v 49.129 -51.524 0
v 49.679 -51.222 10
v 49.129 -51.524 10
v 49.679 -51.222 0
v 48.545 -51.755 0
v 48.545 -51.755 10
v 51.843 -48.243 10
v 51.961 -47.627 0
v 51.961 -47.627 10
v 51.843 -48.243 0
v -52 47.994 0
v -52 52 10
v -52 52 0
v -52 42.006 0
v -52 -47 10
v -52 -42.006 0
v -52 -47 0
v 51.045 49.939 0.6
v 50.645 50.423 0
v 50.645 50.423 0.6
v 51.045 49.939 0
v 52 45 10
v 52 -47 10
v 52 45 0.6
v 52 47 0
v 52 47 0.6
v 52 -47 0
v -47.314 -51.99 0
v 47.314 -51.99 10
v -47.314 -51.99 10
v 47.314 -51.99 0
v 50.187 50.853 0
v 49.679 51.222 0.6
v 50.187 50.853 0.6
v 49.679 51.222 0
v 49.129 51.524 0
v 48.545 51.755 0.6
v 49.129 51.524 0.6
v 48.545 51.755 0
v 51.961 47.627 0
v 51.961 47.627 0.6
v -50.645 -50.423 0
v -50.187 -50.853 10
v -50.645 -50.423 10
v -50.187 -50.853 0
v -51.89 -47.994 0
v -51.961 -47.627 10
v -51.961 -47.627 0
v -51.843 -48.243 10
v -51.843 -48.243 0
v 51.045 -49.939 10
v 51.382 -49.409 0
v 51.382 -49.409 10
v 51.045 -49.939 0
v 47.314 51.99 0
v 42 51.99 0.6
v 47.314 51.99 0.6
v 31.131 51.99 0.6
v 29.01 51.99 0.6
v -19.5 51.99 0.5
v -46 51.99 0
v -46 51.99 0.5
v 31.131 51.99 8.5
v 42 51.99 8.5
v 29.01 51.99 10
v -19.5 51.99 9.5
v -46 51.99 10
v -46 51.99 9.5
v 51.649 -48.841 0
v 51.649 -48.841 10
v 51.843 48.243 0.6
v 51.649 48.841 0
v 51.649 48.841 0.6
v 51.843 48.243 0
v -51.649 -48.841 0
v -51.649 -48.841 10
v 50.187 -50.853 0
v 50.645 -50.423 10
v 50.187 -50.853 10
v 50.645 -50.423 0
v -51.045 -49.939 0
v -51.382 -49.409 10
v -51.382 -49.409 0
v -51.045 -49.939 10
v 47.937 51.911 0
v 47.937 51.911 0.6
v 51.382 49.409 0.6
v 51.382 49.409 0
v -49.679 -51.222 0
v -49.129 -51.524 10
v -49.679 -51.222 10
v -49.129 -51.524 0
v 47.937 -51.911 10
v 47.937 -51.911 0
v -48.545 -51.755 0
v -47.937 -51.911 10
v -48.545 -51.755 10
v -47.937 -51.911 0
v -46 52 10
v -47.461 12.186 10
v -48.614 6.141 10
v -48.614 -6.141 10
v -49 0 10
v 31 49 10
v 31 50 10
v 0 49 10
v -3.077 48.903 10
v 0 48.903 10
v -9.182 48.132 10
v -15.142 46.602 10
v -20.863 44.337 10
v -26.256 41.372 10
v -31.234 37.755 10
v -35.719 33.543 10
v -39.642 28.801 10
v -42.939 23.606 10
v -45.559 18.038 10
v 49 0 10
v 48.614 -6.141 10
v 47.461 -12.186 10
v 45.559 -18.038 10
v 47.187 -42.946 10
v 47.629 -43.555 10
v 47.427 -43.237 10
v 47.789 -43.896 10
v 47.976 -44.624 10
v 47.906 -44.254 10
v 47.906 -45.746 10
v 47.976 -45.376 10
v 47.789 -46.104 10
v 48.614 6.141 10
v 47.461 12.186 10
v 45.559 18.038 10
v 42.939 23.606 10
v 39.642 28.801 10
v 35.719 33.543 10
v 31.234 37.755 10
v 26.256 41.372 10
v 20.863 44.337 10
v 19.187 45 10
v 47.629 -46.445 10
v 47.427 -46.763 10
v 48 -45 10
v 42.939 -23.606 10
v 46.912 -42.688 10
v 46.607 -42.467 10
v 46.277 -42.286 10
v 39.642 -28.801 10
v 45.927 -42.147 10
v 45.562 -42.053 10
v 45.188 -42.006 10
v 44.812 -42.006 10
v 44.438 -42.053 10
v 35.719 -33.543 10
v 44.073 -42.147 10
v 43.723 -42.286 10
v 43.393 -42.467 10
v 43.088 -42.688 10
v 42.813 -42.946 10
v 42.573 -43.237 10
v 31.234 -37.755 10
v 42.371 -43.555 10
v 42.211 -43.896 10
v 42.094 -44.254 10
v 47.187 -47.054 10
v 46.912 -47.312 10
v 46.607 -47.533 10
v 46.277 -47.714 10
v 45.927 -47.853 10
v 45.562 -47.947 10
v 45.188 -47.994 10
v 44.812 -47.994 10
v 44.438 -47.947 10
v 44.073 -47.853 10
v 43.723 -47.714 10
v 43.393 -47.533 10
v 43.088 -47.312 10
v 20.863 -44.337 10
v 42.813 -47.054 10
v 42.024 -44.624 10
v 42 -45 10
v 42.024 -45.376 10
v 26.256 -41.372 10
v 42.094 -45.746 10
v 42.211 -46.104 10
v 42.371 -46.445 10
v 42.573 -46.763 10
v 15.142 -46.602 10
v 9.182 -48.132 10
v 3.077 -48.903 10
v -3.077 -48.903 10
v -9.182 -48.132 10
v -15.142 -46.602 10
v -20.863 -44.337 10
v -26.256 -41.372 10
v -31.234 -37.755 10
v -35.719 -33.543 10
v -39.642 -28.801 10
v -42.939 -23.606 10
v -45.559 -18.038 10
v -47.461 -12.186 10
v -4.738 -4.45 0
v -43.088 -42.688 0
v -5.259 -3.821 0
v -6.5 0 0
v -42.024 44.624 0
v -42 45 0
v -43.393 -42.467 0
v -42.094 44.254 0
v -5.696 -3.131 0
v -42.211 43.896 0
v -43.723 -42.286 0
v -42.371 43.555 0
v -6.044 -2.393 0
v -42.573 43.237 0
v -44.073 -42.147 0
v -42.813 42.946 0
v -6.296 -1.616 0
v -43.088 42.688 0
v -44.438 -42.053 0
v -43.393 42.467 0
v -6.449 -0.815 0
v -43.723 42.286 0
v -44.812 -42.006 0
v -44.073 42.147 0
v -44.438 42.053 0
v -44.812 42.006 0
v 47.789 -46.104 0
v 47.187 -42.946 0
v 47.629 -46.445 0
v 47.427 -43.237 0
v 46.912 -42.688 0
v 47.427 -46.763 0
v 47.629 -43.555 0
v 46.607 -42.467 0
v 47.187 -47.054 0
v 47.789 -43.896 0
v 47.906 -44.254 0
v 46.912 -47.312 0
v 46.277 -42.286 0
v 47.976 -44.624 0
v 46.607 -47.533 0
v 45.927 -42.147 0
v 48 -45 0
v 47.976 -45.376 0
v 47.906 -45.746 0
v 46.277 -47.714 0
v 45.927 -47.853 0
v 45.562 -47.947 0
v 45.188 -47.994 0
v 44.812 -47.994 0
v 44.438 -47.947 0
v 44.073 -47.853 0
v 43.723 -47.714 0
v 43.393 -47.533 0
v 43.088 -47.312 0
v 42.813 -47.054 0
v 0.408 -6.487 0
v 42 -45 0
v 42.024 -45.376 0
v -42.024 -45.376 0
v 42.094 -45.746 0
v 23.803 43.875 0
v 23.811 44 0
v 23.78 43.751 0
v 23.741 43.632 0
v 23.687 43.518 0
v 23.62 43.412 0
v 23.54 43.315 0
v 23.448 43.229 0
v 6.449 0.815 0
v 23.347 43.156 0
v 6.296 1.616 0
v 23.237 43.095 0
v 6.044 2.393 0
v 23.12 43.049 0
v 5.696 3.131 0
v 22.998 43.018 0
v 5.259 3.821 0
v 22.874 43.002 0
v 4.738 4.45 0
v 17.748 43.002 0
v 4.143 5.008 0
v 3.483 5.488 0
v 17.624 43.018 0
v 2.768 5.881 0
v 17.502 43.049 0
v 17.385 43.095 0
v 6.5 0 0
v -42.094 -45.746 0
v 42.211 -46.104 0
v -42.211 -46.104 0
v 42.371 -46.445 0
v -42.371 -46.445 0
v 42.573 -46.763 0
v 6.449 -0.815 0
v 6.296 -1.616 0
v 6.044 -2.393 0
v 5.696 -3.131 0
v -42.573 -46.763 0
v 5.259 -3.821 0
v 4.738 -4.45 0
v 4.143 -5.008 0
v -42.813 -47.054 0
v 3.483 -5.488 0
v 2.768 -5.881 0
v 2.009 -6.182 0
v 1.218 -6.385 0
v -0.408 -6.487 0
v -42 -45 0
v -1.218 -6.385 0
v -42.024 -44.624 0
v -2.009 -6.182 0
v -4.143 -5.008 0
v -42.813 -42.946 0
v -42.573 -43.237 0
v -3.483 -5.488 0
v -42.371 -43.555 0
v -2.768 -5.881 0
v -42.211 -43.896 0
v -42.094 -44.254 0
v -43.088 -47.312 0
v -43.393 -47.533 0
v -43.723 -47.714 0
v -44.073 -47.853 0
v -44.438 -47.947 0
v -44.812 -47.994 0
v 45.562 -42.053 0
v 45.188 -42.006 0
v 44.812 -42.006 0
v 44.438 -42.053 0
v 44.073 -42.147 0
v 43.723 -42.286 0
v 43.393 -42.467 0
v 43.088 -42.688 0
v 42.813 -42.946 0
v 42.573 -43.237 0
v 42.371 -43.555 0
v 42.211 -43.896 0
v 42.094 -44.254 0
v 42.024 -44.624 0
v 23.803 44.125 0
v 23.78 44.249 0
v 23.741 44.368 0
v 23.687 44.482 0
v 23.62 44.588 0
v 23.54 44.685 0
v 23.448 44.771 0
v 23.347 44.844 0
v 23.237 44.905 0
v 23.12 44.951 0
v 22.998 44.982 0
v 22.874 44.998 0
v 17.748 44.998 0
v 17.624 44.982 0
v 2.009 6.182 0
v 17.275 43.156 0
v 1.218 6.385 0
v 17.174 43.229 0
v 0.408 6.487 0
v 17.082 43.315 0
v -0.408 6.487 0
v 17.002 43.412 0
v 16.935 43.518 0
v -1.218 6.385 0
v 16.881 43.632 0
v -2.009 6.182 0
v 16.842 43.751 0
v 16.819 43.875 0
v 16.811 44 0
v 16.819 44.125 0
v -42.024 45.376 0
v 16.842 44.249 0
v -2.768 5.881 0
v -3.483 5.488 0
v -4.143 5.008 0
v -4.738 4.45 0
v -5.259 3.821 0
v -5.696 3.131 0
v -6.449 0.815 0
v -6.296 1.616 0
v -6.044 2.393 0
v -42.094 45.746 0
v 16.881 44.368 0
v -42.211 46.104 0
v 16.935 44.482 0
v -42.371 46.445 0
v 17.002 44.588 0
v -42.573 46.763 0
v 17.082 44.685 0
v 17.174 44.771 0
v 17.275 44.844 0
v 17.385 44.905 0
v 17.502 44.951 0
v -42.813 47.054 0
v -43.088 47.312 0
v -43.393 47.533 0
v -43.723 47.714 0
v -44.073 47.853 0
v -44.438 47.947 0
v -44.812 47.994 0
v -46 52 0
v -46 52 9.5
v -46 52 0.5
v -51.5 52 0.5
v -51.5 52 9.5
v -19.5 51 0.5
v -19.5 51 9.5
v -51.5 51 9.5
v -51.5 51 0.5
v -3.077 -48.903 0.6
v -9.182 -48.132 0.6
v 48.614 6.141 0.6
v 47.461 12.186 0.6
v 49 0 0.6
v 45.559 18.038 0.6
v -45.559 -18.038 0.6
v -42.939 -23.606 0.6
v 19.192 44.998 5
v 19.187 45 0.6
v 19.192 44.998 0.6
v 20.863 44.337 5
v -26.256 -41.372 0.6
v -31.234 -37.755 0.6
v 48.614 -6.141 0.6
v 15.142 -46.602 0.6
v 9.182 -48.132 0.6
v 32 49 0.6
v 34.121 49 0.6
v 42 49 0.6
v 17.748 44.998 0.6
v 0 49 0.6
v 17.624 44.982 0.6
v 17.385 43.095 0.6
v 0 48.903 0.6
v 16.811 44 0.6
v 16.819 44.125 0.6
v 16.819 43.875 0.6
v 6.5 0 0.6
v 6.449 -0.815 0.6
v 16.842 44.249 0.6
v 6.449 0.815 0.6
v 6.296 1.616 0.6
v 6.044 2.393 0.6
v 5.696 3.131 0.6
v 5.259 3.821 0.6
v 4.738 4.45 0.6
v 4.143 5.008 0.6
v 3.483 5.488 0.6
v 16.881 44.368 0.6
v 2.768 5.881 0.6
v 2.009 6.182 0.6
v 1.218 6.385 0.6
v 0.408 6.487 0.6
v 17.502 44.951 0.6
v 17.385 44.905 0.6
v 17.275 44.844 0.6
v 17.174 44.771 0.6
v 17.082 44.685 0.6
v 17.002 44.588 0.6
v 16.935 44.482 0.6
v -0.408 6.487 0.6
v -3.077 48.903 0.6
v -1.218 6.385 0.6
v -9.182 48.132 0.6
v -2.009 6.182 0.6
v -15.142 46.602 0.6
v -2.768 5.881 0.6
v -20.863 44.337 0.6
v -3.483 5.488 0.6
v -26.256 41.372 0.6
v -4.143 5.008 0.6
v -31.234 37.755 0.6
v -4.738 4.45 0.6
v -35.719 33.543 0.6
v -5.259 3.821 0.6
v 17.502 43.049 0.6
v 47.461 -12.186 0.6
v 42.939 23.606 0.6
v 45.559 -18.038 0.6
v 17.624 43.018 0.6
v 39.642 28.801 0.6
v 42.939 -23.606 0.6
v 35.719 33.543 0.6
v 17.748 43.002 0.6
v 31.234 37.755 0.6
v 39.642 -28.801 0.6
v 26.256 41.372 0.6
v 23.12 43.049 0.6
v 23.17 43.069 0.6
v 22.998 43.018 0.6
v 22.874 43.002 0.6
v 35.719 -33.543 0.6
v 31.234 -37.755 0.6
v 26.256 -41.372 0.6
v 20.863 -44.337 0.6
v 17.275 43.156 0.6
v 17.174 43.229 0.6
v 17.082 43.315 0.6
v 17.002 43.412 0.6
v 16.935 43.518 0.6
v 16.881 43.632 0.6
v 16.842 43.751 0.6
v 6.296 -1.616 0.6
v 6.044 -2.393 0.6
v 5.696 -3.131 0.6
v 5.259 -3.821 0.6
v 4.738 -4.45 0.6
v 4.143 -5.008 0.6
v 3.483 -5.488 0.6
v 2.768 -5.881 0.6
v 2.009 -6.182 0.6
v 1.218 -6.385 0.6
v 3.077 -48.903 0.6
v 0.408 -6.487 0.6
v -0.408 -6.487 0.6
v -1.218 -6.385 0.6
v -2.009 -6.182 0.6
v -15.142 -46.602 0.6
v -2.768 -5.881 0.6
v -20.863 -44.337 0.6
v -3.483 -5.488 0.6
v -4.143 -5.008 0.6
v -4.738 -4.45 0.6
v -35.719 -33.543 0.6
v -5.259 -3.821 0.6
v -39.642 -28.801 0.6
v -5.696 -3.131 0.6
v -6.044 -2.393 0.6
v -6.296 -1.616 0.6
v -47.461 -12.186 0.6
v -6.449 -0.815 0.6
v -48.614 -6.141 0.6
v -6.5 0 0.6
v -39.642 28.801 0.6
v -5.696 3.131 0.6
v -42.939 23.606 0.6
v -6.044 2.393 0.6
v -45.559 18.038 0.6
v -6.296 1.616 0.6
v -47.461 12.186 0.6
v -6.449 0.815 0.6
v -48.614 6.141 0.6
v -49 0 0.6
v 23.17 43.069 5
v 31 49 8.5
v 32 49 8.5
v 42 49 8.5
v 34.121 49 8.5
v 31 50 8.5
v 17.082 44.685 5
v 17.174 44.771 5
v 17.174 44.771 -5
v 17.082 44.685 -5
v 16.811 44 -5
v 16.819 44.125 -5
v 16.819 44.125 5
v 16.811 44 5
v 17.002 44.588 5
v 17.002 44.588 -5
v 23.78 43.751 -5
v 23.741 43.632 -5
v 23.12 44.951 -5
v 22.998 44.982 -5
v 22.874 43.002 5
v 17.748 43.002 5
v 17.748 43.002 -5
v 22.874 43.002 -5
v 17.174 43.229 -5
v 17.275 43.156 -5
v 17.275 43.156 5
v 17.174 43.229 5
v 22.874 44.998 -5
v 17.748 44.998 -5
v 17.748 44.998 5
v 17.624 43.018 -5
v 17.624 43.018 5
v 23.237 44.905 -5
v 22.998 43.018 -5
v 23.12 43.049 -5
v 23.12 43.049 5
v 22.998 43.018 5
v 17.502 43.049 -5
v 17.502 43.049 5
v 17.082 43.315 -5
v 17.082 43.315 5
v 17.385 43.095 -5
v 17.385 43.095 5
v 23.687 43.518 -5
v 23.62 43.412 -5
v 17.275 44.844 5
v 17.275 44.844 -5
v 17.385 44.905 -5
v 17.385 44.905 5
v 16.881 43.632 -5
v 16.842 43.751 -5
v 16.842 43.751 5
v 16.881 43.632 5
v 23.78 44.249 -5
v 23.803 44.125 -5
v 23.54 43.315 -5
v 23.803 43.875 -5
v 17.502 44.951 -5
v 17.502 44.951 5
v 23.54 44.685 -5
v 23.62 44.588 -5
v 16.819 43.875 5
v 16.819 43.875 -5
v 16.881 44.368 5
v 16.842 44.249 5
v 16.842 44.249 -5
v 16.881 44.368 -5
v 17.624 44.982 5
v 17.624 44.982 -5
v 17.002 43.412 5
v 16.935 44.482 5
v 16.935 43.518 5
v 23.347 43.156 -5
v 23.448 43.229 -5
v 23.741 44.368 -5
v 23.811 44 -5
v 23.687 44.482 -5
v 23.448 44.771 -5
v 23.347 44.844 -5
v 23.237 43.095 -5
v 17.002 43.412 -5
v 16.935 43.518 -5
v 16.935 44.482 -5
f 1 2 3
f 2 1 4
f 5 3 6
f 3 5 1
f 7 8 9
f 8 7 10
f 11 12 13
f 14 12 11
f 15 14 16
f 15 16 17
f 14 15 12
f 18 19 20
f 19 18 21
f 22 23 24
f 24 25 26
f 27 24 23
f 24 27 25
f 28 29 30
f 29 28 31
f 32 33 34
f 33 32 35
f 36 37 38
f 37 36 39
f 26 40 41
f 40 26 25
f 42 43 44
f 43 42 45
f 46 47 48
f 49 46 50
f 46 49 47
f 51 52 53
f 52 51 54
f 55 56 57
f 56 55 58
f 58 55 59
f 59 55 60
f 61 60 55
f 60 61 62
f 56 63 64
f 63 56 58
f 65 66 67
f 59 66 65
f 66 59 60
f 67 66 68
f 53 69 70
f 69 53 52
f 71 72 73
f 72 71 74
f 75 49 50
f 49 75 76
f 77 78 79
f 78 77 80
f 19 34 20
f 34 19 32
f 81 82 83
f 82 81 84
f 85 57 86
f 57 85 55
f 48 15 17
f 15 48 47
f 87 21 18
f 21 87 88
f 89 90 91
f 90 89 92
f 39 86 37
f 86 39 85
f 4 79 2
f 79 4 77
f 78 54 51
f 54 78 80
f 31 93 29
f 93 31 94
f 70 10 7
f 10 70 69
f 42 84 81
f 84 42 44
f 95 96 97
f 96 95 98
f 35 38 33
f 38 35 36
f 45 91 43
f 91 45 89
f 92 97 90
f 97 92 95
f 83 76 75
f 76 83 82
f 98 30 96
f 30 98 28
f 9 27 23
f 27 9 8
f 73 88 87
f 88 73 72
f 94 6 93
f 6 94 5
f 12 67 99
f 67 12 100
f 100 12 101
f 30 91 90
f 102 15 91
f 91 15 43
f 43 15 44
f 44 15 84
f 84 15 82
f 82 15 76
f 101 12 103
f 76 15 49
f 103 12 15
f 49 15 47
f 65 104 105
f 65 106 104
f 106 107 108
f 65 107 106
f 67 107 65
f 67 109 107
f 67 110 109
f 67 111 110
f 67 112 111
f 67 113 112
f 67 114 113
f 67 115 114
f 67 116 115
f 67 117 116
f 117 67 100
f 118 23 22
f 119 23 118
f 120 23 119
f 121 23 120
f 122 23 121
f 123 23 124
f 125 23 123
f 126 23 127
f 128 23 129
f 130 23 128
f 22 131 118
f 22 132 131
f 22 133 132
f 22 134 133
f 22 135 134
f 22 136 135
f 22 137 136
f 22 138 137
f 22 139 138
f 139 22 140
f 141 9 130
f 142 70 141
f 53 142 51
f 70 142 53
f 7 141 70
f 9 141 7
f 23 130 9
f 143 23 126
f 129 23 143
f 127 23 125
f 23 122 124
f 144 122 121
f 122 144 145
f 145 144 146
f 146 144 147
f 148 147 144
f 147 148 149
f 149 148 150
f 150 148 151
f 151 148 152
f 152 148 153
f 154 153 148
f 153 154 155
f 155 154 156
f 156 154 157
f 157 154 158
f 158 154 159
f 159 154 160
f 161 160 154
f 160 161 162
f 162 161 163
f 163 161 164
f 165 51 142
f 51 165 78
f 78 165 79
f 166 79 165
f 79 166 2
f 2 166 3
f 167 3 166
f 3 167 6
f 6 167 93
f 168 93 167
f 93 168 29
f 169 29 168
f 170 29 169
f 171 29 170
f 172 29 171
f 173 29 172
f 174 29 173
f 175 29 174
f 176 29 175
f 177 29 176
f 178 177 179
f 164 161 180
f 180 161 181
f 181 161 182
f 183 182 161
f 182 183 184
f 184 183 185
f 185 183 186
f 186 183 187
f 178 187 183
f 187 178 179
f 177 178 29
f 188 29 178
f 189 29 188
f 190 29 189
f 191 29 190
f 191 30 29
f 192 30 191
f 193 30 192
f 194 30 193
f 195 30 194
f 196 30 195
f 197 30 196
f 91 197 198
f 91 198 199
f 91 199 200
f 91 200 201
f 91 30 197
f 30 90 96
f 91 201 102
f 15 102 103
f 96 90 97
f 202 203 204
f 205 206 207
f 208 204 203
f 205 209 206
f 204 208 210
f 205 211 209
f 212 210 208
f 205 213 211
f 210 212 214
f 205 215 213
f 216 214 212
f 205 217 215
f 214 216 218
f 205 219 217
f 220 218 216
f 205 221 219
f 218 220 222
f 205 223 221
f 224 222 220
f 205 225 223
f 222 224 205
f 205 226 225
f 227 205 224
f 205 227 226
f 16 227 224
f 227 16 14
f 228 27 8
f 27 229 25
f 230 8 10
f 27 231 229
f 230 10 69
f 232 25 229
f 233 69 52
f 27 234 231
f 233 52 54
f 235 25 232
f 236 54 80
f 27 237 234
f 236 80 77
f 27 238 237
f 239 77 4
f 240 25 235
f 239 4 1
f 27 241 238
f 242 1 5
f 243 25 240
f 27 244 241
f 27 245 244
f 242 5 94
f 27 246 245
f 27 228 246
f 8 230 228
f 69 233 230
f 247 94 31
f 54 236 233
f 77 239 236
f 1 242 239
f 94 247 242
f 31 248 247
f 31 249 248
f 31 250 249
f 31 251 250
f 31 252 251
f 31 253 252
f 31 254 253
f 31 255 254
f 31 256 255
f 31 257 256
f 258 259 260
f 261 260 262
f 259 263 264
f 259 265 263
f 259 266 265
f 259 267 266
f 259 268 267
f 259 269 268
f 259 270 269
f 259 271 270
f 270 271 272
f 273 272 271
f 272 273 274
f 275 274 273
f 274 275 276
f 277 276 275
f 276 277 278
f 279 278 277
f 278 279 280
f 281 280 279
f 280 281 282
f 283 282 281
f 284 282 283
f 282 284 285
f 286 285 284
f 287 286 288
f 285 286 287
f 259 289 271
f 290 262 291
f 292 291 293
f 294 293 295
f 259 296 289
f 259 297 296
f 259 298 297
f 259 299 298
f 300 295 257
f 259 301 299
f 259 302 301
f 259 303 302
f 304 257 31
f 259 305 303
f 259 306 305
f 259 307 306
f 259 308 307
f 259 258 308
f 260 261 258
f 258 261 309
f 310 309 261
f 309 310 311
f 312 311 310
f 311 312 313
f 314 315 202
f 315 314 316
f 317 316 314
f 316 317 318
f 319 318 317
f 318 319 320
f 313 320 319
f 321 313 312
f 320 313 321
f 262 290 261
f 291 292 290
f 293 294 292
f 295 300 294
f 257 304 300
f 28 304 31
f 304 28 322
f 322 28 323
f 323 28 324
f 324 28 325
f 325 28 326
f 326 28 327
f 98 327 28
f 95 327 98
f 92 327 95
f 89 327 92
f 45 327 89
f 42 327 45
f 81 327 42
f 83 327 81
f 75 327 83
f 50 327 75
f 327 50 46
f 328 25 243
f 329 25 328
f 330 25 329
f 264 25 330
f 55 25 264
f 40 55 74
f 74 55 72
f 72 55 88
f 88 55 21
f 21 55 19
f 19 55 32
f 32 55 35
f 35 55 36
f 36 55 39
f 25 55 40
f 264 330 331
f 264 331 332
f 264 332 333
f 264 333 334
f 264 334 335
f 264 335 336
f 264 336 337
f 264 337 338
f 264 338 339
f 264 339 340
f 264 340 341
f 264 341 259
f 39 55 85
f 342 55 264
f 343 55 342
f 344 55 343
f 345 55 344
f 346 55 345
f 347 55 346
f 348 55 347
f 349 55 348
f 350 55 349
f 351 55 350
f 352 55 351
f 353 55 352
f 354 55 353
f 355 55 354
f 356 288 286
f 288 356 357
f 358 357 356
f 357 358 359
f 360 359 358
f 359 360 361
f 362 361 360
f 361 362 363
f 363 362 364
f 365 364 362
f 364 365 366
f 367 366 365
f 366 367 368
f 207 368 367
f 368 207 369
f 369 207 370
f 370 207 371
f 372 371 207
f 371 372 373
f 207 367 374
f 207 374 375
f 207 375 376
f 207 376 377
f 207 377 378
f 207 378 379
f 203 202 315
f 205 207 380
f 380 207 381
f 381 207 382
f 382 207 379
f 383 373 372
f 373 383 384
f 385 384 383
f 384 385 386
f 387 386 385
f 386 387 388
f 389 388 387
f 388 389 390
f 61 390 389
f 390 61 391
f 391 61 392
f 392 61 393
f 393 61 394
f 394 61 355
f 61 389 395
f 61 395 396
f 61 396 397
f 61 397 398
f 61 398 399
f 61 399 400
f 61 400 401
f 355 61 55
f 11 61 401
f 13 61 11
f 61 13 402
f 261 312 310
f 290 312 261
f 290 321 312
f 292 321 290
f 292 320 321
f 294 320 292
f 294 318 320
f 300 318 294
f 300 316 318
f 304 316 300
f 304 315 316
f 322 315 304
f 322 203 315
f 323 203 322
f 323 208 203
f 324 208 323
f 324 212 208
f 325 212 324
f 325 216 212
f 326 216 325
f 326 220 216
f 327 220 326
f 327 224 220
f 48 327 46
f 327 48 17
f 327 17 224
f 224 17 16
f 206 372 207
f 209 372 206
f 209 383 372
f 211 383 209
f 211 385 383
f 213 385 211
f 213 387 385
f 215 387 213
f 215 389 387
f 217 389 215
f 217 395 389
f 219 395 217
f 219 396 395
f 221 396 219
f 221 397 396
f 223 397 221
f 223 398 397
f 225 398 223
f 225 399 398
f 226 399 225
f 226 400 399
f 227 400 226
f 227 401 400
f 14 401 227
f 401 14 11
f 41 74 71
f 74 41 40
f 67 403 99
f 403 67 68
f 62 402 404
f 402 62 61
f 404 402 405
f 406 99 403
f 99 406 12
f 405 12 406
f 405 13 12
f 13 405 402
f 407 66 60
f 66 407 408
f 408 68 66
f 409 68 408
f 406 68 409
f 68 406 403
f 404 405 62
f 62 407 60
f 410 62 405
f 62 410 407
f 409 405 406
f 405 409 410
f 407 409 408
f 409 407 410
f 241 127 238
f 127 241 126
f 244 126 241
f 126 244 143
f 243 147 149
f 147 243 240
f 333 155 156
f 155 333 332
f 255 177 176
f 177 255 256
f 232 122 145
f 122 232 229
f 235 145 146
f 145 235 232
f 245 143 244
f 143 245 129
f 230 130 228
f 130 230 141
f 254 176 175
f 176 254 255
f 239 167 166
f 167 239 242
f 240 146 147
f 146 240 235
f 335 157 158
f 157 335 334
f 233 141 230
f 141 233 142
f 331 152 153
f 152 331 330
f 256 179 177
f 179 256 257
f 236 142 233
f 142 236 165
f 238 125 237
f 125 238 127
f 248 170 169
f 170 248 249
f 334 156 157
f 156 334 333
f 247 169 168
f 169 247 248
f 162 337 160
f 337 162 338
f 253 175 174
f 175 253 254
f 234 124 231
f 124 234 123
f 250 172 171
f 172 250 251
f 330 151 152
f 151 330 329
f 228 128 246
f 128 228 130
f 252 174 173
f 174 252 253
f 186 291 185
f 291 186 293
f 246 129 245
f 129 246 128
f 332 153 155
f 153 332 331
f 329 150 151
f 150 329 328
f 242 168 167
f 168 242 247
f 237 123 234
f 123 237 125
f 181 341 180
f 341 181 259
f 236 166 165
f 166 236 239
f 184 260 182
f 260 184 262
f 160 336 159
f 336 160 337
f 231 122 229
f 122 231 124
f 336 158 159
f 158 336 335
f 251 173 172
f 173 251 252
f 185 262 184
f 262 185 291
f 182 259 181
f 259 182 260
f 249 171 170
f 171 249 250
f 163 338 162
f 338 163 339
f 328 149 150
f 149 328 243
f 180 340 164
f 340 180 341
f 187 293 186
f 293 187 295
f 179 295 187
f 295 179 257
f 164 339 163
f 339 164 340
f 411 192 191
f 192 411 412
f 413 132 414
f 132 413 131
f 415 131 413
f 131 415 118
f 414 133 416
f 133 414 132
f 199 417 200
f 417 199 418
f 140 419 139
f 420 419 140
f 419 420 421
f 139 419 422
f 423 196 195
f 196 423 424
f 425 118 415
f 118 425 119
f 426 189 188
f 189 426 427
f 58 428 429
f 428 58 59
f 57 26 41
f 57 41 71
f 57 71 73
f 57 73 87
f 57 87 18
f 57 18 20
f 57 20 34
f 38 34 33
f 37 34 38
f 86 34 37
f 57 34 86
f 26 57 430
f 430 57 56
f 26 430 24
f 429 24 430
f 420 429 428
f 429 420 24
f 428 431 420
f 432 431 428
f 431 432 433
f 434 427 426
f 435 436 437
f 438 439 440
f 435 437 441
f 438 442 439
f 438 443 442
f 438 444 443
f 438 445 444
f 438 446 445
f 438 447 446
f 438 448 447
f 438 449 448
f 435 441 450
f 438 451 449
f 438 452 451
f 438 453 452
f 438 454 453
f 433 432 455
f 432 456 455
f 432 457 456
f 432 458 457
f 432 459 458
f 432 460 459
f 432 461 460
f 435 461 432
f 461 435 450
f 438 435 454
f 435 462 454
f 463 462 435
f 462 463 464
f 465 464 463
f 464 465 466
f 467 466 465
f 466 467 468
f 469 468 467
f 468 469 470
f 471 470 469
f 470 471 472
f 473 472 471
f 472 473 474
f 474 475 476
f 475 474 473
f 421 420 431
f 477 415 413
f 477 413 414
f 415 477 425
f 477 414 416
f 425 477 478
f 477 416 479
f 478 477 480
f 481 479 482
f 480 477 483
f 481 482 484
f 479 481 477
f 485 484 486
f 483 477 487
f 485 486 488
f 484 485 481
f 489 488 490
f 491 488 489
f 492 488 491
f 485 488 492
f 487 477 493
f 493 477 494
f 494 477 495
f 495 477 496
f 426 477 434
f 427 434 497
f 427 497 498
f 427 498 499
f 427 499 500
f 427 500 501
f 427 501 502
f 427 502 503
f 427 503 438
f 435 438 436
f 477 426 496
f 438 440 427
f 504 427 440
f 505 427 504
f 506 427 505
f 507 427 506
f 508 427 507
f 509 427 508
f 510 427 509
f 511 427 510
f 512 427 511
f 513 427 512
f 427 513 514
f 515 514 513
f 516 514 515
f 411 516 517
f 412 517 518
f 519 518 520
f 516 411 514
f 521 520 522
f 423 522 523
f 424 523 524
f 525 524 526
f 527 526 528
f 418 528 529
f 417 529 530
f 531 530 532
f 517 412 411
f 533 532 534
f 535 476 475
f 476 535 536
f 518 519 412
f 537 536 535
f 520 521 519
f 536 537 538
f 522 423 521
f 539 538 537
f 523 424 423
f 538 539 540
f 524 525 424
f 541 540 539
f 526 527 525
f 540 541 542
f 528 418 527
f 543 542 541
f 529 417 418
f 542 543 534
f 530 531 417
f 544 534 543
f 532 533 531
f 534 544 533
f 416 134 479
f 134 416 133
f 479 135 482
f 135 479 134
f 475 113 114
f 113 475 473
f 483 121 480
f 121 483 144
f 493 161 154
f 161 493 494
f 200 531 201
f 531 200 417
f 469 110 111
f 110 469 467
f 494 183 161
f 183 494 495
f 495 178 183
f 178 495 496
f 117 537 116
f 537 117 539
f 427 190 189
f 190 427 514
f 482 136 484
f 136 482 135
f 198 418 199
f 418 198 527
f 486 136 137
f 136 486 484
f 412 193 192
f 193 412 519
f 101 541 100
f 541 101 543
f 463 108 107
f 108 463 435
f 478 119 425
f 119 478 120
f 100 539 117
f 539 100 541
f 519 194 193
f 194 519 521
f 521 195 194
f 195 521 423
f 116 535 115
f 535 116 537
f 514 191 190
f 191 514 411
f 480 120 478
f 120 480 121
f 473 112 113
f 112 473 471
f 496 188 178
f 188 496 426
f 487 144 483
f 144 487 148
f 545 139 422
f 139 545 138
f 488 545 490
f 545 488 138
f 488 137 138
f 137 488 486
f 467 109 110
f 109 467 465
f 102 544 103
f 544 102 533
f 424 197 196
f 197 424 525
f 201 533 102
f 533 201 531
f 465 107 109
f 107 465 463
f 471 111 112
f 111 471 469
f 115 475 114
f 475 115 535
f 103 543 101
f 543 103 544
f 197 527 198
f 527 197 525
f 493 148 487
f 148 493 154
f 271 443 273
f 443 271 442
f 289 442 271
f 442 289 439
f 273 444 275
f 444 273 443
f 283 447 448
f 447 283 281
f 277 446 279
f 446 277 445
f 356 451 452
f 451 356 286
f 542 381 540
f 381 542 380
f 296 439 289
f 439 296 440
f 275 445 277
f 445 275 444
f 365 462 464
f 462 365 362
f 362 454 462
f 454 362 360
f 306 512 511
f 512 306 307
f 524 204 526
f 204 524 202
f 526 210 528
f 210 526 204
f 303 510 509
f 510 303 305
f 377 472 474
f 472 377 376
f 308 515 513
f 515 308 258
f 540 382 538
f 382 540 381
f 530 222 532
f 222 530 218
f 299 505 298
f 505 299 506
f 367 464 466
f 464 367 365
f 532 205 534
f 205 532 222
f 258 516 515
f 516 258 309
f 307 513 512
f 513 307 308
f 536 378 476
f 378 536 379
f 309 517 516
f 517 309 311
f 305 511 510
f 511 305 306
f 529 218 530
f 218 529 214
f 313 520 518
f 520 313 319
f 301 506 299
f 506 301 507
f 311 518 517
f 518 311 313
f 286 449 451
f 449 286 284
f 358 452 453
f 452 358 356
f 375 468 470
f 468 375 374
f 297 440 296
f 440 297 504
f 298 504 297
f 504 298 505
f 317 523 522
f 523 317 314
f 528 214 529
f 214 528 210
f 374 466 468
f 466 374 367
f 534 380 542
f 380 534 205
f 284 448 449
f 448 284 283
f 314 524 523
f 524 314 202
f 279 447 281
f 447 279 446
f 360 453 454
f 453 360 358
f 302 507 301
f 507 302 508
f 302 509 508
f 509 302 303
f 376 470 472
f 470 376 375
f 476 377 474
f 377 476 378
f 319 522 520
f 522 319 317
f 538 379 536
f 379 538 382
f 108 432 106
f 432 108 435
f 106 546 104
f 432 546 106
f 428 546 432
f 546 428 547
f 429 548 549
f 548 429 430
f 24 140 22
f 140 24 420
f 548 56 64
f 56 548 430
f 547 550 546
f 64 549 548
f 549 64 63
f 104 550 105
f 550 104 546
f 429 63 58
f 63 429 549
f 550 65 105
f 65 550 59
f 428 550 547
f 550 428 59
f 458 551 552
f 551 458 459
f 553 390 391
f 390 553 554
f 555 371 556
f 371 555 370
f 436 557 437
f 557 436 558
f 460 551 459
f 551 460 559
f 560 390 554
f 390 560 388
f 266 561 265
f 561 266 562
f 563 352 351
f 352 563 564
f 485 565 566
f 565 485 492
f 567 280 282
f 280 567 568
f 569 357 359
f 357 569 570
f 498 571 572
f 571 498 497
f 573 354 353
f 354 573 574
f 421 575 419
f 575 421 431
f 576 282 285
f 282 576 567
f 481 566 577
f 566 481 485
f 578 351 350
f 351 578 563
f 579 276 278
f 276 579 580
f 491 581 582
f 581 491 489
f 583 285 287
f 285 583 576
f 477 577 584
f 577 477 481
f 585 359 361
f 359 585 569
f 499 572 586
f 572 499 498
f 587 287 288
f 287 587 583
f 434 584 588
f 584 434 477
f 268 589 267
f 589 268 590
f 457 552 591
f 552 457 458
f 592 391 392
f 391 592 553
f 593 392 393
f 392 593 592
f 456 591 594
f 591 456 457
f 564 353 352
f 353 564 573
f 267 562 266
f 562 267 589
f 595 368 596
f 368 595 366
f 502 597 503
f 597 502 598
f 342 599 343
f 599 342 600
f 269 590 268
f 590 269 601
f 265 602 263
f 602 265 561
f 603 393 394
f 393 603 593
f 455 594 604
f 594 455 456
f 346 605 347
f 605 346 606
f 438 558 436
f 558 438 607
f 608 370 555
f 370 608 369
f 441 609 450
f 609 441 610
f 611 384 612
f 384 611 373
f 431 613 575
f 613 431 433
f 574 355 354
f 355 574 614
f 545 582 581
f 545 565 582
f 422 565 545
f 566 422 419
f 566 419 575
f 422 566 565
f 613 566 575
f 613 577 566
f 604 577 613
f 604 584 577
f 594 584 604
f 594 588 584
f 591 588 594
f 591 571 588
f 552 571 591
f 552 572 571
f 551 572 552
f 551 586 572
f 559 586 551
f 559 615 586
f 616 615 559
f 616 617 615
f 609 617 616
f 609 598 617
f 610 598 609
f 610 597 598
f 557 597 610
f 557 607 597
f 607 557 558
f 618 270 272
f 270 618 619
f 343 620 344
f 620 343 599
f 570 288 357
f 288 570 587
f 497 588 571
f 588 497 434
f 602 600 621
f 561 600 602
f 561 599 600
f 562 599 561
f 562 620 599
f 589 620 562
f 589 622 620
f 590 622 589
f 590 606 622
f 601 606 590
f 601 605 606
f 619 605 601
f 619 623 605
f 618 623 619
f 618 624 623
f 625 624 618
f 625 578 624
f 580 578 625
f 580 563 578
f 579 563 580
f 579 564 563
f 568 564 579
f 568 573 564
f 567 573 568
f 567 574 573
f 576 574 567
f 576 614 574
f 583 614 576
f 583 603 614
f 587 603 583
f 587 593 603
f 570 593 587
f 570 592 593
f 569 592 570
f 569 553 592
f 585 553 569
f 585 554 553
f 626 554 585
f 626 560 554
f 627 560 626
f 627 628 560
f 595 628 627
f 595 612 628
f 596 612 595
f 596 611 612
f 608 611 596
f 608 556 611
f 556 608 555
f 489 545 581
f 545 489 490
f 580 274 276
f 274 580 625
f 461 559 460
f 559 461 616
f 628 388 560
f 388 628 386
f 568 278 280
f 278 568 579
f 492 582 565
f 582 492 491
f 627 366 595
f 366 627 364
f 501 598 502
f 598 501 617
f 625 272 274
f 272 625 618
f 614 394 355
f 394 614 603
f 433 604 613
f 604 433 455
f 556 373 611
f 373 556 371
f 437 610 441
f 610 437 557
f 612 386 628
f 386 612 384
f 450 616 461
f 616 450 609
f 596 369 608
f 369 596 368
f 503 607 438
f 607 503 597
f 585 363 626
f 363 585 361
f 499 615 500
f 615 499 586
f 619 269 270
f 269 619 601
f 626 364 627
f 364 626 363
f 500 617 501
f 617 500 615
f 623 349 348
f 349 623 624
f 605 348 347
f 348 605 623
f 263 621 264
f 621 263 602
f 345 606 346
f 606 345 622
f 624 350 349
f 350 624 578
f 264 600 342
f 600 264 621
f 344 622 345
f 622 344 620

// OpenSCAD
$fn = 50;


union() {
	difference() {
		union() {
			hull() {
				translate(v = [-47.0000000000, 47.0000000000, 0]) {
					cylinder(h = 10, r = 5);
				}
				translate(v = [47.0000000000, 47.0000000000, 0]) {
					cylinder(h = 10, r = 5);
				}
				translate(v = [-47.0000000000, -47.0000000000, 0]) {
					cylinder(h = 10, r = 5);
				}
				translate(v = [47.0000000000, -47.0000000000, 0]) {
					cylinder(h = 10, r = 5);
				}
			}
			translate(v = [-52.0000000000, 46.0000000000, 0]) {
				cube(size = [6, 6, 10]);
			}
		}
		union() {
			translate(v = [-52.5000000000, -45.0000000000, -250.0000000000]) {
				rotate(a = [0, 0, 0]) {
					difference() {
						union() {
							hull() {
								translate(v = [7.5000000000, 0, 0]) {
									cylinder(h = 250, r = 3.0000000000, r1 = 3.0000000000, r2 = 3.0000000000);
								}
								translate(v = [-7.5000000000, 0, 0]) {
									cylinder(h = 250, r = 3.0000000000, r1 = 3.0000000000, r2 = 3.0000000000);
								}
							}
						}
						union();
					}
				}
			}
			translate(v = [-52.5000000000, 45.0000000000, -250.0000000000]) {
				rotate(a = [0, 0, 0]) {
					difference() {
						union() {
							hull() {
								translate(v = [7.5000000000, 0, 0]) {
									cylinder(h = 250, r = 3.0000000000, r1 = 3.0000000000, r2 = 3.0000000000);
								}
								translate(v = [-7.5000000000, 0, 0]) {
									cylinder(h = 250, r = 3.0000000000, r1 = 3.0000000000, r2 = 3.0000000000);
								}
							}
						}
						union();
					}
				}
			}
			translate(v = [-51.5000000000, 51.0000000000, 0.5000000000]) {
				cube(size = [32, 1, 9.0000000000]);
			}
			translate(v = [45.0000000000, -45.0000000000, 0]) {
				cylinder(h = 100, r = 3.0000000000);
			}
			translate(v = [0, 0, 0.6000000000]) {
				cylinder(h = 12.4000000000, r = 49.0000000000);
			}
			translate(v = [0, 0, -5.0000000000]) {
				cylinder(h = 10, r = 6.5000000000);
			}
			translate(v = [0.0000000000, 45.0000000000, 0.6000000000]) {
				cube(size = [52.0000000000, 4, 12.4000000000]);
			}
			translate(v = [42.0000000000, 45.0000000000, 0.6000000000]) {
				cube(size = [10, 7, 12.4000000000]);
			}
			translate(v = [31.0000000000, 45.0000000000, 8.5000000000]) {
				cube(size = [21, 7, 1.5000000000]);
			}
			translate(v = [28.2500000000, 52.7500000000, 0.6000000000]) {
				rotate(a = [0, 0, -45]) {
					cube(size = [7.5000000000, 1.5000000000, 12.4000000000]);
				}
			}
			translate(v = [11.0610000000, 43.0000000000, 0.6000000000]) {
				cube(size = [7.5000000000, 2, 9.4000000000]);
			}
		}
	}
	union() {
		translate(v = [20.3110000000, 44.0000000000, -5.0000000000]) {
			rotate(a = [0, 0, 0]) {
				difference() {
					union() {
						#hull() {
							#translate(v = [2.5000000000, 0, 0]) {
								cylinder(h = 10, r = 1.0000000000, r1 = 1.0000000000, r2 = 1.0000000000);
							}
							#translate(v = [-2.5000000000, 0, 0]) {
								cylinder(h = 10, r = 1.0000000000, r1 = 1.0000000000, r2 = 1.0000000000);
							}
						}
					}
					union();
				}
			}
		}
	}
}
